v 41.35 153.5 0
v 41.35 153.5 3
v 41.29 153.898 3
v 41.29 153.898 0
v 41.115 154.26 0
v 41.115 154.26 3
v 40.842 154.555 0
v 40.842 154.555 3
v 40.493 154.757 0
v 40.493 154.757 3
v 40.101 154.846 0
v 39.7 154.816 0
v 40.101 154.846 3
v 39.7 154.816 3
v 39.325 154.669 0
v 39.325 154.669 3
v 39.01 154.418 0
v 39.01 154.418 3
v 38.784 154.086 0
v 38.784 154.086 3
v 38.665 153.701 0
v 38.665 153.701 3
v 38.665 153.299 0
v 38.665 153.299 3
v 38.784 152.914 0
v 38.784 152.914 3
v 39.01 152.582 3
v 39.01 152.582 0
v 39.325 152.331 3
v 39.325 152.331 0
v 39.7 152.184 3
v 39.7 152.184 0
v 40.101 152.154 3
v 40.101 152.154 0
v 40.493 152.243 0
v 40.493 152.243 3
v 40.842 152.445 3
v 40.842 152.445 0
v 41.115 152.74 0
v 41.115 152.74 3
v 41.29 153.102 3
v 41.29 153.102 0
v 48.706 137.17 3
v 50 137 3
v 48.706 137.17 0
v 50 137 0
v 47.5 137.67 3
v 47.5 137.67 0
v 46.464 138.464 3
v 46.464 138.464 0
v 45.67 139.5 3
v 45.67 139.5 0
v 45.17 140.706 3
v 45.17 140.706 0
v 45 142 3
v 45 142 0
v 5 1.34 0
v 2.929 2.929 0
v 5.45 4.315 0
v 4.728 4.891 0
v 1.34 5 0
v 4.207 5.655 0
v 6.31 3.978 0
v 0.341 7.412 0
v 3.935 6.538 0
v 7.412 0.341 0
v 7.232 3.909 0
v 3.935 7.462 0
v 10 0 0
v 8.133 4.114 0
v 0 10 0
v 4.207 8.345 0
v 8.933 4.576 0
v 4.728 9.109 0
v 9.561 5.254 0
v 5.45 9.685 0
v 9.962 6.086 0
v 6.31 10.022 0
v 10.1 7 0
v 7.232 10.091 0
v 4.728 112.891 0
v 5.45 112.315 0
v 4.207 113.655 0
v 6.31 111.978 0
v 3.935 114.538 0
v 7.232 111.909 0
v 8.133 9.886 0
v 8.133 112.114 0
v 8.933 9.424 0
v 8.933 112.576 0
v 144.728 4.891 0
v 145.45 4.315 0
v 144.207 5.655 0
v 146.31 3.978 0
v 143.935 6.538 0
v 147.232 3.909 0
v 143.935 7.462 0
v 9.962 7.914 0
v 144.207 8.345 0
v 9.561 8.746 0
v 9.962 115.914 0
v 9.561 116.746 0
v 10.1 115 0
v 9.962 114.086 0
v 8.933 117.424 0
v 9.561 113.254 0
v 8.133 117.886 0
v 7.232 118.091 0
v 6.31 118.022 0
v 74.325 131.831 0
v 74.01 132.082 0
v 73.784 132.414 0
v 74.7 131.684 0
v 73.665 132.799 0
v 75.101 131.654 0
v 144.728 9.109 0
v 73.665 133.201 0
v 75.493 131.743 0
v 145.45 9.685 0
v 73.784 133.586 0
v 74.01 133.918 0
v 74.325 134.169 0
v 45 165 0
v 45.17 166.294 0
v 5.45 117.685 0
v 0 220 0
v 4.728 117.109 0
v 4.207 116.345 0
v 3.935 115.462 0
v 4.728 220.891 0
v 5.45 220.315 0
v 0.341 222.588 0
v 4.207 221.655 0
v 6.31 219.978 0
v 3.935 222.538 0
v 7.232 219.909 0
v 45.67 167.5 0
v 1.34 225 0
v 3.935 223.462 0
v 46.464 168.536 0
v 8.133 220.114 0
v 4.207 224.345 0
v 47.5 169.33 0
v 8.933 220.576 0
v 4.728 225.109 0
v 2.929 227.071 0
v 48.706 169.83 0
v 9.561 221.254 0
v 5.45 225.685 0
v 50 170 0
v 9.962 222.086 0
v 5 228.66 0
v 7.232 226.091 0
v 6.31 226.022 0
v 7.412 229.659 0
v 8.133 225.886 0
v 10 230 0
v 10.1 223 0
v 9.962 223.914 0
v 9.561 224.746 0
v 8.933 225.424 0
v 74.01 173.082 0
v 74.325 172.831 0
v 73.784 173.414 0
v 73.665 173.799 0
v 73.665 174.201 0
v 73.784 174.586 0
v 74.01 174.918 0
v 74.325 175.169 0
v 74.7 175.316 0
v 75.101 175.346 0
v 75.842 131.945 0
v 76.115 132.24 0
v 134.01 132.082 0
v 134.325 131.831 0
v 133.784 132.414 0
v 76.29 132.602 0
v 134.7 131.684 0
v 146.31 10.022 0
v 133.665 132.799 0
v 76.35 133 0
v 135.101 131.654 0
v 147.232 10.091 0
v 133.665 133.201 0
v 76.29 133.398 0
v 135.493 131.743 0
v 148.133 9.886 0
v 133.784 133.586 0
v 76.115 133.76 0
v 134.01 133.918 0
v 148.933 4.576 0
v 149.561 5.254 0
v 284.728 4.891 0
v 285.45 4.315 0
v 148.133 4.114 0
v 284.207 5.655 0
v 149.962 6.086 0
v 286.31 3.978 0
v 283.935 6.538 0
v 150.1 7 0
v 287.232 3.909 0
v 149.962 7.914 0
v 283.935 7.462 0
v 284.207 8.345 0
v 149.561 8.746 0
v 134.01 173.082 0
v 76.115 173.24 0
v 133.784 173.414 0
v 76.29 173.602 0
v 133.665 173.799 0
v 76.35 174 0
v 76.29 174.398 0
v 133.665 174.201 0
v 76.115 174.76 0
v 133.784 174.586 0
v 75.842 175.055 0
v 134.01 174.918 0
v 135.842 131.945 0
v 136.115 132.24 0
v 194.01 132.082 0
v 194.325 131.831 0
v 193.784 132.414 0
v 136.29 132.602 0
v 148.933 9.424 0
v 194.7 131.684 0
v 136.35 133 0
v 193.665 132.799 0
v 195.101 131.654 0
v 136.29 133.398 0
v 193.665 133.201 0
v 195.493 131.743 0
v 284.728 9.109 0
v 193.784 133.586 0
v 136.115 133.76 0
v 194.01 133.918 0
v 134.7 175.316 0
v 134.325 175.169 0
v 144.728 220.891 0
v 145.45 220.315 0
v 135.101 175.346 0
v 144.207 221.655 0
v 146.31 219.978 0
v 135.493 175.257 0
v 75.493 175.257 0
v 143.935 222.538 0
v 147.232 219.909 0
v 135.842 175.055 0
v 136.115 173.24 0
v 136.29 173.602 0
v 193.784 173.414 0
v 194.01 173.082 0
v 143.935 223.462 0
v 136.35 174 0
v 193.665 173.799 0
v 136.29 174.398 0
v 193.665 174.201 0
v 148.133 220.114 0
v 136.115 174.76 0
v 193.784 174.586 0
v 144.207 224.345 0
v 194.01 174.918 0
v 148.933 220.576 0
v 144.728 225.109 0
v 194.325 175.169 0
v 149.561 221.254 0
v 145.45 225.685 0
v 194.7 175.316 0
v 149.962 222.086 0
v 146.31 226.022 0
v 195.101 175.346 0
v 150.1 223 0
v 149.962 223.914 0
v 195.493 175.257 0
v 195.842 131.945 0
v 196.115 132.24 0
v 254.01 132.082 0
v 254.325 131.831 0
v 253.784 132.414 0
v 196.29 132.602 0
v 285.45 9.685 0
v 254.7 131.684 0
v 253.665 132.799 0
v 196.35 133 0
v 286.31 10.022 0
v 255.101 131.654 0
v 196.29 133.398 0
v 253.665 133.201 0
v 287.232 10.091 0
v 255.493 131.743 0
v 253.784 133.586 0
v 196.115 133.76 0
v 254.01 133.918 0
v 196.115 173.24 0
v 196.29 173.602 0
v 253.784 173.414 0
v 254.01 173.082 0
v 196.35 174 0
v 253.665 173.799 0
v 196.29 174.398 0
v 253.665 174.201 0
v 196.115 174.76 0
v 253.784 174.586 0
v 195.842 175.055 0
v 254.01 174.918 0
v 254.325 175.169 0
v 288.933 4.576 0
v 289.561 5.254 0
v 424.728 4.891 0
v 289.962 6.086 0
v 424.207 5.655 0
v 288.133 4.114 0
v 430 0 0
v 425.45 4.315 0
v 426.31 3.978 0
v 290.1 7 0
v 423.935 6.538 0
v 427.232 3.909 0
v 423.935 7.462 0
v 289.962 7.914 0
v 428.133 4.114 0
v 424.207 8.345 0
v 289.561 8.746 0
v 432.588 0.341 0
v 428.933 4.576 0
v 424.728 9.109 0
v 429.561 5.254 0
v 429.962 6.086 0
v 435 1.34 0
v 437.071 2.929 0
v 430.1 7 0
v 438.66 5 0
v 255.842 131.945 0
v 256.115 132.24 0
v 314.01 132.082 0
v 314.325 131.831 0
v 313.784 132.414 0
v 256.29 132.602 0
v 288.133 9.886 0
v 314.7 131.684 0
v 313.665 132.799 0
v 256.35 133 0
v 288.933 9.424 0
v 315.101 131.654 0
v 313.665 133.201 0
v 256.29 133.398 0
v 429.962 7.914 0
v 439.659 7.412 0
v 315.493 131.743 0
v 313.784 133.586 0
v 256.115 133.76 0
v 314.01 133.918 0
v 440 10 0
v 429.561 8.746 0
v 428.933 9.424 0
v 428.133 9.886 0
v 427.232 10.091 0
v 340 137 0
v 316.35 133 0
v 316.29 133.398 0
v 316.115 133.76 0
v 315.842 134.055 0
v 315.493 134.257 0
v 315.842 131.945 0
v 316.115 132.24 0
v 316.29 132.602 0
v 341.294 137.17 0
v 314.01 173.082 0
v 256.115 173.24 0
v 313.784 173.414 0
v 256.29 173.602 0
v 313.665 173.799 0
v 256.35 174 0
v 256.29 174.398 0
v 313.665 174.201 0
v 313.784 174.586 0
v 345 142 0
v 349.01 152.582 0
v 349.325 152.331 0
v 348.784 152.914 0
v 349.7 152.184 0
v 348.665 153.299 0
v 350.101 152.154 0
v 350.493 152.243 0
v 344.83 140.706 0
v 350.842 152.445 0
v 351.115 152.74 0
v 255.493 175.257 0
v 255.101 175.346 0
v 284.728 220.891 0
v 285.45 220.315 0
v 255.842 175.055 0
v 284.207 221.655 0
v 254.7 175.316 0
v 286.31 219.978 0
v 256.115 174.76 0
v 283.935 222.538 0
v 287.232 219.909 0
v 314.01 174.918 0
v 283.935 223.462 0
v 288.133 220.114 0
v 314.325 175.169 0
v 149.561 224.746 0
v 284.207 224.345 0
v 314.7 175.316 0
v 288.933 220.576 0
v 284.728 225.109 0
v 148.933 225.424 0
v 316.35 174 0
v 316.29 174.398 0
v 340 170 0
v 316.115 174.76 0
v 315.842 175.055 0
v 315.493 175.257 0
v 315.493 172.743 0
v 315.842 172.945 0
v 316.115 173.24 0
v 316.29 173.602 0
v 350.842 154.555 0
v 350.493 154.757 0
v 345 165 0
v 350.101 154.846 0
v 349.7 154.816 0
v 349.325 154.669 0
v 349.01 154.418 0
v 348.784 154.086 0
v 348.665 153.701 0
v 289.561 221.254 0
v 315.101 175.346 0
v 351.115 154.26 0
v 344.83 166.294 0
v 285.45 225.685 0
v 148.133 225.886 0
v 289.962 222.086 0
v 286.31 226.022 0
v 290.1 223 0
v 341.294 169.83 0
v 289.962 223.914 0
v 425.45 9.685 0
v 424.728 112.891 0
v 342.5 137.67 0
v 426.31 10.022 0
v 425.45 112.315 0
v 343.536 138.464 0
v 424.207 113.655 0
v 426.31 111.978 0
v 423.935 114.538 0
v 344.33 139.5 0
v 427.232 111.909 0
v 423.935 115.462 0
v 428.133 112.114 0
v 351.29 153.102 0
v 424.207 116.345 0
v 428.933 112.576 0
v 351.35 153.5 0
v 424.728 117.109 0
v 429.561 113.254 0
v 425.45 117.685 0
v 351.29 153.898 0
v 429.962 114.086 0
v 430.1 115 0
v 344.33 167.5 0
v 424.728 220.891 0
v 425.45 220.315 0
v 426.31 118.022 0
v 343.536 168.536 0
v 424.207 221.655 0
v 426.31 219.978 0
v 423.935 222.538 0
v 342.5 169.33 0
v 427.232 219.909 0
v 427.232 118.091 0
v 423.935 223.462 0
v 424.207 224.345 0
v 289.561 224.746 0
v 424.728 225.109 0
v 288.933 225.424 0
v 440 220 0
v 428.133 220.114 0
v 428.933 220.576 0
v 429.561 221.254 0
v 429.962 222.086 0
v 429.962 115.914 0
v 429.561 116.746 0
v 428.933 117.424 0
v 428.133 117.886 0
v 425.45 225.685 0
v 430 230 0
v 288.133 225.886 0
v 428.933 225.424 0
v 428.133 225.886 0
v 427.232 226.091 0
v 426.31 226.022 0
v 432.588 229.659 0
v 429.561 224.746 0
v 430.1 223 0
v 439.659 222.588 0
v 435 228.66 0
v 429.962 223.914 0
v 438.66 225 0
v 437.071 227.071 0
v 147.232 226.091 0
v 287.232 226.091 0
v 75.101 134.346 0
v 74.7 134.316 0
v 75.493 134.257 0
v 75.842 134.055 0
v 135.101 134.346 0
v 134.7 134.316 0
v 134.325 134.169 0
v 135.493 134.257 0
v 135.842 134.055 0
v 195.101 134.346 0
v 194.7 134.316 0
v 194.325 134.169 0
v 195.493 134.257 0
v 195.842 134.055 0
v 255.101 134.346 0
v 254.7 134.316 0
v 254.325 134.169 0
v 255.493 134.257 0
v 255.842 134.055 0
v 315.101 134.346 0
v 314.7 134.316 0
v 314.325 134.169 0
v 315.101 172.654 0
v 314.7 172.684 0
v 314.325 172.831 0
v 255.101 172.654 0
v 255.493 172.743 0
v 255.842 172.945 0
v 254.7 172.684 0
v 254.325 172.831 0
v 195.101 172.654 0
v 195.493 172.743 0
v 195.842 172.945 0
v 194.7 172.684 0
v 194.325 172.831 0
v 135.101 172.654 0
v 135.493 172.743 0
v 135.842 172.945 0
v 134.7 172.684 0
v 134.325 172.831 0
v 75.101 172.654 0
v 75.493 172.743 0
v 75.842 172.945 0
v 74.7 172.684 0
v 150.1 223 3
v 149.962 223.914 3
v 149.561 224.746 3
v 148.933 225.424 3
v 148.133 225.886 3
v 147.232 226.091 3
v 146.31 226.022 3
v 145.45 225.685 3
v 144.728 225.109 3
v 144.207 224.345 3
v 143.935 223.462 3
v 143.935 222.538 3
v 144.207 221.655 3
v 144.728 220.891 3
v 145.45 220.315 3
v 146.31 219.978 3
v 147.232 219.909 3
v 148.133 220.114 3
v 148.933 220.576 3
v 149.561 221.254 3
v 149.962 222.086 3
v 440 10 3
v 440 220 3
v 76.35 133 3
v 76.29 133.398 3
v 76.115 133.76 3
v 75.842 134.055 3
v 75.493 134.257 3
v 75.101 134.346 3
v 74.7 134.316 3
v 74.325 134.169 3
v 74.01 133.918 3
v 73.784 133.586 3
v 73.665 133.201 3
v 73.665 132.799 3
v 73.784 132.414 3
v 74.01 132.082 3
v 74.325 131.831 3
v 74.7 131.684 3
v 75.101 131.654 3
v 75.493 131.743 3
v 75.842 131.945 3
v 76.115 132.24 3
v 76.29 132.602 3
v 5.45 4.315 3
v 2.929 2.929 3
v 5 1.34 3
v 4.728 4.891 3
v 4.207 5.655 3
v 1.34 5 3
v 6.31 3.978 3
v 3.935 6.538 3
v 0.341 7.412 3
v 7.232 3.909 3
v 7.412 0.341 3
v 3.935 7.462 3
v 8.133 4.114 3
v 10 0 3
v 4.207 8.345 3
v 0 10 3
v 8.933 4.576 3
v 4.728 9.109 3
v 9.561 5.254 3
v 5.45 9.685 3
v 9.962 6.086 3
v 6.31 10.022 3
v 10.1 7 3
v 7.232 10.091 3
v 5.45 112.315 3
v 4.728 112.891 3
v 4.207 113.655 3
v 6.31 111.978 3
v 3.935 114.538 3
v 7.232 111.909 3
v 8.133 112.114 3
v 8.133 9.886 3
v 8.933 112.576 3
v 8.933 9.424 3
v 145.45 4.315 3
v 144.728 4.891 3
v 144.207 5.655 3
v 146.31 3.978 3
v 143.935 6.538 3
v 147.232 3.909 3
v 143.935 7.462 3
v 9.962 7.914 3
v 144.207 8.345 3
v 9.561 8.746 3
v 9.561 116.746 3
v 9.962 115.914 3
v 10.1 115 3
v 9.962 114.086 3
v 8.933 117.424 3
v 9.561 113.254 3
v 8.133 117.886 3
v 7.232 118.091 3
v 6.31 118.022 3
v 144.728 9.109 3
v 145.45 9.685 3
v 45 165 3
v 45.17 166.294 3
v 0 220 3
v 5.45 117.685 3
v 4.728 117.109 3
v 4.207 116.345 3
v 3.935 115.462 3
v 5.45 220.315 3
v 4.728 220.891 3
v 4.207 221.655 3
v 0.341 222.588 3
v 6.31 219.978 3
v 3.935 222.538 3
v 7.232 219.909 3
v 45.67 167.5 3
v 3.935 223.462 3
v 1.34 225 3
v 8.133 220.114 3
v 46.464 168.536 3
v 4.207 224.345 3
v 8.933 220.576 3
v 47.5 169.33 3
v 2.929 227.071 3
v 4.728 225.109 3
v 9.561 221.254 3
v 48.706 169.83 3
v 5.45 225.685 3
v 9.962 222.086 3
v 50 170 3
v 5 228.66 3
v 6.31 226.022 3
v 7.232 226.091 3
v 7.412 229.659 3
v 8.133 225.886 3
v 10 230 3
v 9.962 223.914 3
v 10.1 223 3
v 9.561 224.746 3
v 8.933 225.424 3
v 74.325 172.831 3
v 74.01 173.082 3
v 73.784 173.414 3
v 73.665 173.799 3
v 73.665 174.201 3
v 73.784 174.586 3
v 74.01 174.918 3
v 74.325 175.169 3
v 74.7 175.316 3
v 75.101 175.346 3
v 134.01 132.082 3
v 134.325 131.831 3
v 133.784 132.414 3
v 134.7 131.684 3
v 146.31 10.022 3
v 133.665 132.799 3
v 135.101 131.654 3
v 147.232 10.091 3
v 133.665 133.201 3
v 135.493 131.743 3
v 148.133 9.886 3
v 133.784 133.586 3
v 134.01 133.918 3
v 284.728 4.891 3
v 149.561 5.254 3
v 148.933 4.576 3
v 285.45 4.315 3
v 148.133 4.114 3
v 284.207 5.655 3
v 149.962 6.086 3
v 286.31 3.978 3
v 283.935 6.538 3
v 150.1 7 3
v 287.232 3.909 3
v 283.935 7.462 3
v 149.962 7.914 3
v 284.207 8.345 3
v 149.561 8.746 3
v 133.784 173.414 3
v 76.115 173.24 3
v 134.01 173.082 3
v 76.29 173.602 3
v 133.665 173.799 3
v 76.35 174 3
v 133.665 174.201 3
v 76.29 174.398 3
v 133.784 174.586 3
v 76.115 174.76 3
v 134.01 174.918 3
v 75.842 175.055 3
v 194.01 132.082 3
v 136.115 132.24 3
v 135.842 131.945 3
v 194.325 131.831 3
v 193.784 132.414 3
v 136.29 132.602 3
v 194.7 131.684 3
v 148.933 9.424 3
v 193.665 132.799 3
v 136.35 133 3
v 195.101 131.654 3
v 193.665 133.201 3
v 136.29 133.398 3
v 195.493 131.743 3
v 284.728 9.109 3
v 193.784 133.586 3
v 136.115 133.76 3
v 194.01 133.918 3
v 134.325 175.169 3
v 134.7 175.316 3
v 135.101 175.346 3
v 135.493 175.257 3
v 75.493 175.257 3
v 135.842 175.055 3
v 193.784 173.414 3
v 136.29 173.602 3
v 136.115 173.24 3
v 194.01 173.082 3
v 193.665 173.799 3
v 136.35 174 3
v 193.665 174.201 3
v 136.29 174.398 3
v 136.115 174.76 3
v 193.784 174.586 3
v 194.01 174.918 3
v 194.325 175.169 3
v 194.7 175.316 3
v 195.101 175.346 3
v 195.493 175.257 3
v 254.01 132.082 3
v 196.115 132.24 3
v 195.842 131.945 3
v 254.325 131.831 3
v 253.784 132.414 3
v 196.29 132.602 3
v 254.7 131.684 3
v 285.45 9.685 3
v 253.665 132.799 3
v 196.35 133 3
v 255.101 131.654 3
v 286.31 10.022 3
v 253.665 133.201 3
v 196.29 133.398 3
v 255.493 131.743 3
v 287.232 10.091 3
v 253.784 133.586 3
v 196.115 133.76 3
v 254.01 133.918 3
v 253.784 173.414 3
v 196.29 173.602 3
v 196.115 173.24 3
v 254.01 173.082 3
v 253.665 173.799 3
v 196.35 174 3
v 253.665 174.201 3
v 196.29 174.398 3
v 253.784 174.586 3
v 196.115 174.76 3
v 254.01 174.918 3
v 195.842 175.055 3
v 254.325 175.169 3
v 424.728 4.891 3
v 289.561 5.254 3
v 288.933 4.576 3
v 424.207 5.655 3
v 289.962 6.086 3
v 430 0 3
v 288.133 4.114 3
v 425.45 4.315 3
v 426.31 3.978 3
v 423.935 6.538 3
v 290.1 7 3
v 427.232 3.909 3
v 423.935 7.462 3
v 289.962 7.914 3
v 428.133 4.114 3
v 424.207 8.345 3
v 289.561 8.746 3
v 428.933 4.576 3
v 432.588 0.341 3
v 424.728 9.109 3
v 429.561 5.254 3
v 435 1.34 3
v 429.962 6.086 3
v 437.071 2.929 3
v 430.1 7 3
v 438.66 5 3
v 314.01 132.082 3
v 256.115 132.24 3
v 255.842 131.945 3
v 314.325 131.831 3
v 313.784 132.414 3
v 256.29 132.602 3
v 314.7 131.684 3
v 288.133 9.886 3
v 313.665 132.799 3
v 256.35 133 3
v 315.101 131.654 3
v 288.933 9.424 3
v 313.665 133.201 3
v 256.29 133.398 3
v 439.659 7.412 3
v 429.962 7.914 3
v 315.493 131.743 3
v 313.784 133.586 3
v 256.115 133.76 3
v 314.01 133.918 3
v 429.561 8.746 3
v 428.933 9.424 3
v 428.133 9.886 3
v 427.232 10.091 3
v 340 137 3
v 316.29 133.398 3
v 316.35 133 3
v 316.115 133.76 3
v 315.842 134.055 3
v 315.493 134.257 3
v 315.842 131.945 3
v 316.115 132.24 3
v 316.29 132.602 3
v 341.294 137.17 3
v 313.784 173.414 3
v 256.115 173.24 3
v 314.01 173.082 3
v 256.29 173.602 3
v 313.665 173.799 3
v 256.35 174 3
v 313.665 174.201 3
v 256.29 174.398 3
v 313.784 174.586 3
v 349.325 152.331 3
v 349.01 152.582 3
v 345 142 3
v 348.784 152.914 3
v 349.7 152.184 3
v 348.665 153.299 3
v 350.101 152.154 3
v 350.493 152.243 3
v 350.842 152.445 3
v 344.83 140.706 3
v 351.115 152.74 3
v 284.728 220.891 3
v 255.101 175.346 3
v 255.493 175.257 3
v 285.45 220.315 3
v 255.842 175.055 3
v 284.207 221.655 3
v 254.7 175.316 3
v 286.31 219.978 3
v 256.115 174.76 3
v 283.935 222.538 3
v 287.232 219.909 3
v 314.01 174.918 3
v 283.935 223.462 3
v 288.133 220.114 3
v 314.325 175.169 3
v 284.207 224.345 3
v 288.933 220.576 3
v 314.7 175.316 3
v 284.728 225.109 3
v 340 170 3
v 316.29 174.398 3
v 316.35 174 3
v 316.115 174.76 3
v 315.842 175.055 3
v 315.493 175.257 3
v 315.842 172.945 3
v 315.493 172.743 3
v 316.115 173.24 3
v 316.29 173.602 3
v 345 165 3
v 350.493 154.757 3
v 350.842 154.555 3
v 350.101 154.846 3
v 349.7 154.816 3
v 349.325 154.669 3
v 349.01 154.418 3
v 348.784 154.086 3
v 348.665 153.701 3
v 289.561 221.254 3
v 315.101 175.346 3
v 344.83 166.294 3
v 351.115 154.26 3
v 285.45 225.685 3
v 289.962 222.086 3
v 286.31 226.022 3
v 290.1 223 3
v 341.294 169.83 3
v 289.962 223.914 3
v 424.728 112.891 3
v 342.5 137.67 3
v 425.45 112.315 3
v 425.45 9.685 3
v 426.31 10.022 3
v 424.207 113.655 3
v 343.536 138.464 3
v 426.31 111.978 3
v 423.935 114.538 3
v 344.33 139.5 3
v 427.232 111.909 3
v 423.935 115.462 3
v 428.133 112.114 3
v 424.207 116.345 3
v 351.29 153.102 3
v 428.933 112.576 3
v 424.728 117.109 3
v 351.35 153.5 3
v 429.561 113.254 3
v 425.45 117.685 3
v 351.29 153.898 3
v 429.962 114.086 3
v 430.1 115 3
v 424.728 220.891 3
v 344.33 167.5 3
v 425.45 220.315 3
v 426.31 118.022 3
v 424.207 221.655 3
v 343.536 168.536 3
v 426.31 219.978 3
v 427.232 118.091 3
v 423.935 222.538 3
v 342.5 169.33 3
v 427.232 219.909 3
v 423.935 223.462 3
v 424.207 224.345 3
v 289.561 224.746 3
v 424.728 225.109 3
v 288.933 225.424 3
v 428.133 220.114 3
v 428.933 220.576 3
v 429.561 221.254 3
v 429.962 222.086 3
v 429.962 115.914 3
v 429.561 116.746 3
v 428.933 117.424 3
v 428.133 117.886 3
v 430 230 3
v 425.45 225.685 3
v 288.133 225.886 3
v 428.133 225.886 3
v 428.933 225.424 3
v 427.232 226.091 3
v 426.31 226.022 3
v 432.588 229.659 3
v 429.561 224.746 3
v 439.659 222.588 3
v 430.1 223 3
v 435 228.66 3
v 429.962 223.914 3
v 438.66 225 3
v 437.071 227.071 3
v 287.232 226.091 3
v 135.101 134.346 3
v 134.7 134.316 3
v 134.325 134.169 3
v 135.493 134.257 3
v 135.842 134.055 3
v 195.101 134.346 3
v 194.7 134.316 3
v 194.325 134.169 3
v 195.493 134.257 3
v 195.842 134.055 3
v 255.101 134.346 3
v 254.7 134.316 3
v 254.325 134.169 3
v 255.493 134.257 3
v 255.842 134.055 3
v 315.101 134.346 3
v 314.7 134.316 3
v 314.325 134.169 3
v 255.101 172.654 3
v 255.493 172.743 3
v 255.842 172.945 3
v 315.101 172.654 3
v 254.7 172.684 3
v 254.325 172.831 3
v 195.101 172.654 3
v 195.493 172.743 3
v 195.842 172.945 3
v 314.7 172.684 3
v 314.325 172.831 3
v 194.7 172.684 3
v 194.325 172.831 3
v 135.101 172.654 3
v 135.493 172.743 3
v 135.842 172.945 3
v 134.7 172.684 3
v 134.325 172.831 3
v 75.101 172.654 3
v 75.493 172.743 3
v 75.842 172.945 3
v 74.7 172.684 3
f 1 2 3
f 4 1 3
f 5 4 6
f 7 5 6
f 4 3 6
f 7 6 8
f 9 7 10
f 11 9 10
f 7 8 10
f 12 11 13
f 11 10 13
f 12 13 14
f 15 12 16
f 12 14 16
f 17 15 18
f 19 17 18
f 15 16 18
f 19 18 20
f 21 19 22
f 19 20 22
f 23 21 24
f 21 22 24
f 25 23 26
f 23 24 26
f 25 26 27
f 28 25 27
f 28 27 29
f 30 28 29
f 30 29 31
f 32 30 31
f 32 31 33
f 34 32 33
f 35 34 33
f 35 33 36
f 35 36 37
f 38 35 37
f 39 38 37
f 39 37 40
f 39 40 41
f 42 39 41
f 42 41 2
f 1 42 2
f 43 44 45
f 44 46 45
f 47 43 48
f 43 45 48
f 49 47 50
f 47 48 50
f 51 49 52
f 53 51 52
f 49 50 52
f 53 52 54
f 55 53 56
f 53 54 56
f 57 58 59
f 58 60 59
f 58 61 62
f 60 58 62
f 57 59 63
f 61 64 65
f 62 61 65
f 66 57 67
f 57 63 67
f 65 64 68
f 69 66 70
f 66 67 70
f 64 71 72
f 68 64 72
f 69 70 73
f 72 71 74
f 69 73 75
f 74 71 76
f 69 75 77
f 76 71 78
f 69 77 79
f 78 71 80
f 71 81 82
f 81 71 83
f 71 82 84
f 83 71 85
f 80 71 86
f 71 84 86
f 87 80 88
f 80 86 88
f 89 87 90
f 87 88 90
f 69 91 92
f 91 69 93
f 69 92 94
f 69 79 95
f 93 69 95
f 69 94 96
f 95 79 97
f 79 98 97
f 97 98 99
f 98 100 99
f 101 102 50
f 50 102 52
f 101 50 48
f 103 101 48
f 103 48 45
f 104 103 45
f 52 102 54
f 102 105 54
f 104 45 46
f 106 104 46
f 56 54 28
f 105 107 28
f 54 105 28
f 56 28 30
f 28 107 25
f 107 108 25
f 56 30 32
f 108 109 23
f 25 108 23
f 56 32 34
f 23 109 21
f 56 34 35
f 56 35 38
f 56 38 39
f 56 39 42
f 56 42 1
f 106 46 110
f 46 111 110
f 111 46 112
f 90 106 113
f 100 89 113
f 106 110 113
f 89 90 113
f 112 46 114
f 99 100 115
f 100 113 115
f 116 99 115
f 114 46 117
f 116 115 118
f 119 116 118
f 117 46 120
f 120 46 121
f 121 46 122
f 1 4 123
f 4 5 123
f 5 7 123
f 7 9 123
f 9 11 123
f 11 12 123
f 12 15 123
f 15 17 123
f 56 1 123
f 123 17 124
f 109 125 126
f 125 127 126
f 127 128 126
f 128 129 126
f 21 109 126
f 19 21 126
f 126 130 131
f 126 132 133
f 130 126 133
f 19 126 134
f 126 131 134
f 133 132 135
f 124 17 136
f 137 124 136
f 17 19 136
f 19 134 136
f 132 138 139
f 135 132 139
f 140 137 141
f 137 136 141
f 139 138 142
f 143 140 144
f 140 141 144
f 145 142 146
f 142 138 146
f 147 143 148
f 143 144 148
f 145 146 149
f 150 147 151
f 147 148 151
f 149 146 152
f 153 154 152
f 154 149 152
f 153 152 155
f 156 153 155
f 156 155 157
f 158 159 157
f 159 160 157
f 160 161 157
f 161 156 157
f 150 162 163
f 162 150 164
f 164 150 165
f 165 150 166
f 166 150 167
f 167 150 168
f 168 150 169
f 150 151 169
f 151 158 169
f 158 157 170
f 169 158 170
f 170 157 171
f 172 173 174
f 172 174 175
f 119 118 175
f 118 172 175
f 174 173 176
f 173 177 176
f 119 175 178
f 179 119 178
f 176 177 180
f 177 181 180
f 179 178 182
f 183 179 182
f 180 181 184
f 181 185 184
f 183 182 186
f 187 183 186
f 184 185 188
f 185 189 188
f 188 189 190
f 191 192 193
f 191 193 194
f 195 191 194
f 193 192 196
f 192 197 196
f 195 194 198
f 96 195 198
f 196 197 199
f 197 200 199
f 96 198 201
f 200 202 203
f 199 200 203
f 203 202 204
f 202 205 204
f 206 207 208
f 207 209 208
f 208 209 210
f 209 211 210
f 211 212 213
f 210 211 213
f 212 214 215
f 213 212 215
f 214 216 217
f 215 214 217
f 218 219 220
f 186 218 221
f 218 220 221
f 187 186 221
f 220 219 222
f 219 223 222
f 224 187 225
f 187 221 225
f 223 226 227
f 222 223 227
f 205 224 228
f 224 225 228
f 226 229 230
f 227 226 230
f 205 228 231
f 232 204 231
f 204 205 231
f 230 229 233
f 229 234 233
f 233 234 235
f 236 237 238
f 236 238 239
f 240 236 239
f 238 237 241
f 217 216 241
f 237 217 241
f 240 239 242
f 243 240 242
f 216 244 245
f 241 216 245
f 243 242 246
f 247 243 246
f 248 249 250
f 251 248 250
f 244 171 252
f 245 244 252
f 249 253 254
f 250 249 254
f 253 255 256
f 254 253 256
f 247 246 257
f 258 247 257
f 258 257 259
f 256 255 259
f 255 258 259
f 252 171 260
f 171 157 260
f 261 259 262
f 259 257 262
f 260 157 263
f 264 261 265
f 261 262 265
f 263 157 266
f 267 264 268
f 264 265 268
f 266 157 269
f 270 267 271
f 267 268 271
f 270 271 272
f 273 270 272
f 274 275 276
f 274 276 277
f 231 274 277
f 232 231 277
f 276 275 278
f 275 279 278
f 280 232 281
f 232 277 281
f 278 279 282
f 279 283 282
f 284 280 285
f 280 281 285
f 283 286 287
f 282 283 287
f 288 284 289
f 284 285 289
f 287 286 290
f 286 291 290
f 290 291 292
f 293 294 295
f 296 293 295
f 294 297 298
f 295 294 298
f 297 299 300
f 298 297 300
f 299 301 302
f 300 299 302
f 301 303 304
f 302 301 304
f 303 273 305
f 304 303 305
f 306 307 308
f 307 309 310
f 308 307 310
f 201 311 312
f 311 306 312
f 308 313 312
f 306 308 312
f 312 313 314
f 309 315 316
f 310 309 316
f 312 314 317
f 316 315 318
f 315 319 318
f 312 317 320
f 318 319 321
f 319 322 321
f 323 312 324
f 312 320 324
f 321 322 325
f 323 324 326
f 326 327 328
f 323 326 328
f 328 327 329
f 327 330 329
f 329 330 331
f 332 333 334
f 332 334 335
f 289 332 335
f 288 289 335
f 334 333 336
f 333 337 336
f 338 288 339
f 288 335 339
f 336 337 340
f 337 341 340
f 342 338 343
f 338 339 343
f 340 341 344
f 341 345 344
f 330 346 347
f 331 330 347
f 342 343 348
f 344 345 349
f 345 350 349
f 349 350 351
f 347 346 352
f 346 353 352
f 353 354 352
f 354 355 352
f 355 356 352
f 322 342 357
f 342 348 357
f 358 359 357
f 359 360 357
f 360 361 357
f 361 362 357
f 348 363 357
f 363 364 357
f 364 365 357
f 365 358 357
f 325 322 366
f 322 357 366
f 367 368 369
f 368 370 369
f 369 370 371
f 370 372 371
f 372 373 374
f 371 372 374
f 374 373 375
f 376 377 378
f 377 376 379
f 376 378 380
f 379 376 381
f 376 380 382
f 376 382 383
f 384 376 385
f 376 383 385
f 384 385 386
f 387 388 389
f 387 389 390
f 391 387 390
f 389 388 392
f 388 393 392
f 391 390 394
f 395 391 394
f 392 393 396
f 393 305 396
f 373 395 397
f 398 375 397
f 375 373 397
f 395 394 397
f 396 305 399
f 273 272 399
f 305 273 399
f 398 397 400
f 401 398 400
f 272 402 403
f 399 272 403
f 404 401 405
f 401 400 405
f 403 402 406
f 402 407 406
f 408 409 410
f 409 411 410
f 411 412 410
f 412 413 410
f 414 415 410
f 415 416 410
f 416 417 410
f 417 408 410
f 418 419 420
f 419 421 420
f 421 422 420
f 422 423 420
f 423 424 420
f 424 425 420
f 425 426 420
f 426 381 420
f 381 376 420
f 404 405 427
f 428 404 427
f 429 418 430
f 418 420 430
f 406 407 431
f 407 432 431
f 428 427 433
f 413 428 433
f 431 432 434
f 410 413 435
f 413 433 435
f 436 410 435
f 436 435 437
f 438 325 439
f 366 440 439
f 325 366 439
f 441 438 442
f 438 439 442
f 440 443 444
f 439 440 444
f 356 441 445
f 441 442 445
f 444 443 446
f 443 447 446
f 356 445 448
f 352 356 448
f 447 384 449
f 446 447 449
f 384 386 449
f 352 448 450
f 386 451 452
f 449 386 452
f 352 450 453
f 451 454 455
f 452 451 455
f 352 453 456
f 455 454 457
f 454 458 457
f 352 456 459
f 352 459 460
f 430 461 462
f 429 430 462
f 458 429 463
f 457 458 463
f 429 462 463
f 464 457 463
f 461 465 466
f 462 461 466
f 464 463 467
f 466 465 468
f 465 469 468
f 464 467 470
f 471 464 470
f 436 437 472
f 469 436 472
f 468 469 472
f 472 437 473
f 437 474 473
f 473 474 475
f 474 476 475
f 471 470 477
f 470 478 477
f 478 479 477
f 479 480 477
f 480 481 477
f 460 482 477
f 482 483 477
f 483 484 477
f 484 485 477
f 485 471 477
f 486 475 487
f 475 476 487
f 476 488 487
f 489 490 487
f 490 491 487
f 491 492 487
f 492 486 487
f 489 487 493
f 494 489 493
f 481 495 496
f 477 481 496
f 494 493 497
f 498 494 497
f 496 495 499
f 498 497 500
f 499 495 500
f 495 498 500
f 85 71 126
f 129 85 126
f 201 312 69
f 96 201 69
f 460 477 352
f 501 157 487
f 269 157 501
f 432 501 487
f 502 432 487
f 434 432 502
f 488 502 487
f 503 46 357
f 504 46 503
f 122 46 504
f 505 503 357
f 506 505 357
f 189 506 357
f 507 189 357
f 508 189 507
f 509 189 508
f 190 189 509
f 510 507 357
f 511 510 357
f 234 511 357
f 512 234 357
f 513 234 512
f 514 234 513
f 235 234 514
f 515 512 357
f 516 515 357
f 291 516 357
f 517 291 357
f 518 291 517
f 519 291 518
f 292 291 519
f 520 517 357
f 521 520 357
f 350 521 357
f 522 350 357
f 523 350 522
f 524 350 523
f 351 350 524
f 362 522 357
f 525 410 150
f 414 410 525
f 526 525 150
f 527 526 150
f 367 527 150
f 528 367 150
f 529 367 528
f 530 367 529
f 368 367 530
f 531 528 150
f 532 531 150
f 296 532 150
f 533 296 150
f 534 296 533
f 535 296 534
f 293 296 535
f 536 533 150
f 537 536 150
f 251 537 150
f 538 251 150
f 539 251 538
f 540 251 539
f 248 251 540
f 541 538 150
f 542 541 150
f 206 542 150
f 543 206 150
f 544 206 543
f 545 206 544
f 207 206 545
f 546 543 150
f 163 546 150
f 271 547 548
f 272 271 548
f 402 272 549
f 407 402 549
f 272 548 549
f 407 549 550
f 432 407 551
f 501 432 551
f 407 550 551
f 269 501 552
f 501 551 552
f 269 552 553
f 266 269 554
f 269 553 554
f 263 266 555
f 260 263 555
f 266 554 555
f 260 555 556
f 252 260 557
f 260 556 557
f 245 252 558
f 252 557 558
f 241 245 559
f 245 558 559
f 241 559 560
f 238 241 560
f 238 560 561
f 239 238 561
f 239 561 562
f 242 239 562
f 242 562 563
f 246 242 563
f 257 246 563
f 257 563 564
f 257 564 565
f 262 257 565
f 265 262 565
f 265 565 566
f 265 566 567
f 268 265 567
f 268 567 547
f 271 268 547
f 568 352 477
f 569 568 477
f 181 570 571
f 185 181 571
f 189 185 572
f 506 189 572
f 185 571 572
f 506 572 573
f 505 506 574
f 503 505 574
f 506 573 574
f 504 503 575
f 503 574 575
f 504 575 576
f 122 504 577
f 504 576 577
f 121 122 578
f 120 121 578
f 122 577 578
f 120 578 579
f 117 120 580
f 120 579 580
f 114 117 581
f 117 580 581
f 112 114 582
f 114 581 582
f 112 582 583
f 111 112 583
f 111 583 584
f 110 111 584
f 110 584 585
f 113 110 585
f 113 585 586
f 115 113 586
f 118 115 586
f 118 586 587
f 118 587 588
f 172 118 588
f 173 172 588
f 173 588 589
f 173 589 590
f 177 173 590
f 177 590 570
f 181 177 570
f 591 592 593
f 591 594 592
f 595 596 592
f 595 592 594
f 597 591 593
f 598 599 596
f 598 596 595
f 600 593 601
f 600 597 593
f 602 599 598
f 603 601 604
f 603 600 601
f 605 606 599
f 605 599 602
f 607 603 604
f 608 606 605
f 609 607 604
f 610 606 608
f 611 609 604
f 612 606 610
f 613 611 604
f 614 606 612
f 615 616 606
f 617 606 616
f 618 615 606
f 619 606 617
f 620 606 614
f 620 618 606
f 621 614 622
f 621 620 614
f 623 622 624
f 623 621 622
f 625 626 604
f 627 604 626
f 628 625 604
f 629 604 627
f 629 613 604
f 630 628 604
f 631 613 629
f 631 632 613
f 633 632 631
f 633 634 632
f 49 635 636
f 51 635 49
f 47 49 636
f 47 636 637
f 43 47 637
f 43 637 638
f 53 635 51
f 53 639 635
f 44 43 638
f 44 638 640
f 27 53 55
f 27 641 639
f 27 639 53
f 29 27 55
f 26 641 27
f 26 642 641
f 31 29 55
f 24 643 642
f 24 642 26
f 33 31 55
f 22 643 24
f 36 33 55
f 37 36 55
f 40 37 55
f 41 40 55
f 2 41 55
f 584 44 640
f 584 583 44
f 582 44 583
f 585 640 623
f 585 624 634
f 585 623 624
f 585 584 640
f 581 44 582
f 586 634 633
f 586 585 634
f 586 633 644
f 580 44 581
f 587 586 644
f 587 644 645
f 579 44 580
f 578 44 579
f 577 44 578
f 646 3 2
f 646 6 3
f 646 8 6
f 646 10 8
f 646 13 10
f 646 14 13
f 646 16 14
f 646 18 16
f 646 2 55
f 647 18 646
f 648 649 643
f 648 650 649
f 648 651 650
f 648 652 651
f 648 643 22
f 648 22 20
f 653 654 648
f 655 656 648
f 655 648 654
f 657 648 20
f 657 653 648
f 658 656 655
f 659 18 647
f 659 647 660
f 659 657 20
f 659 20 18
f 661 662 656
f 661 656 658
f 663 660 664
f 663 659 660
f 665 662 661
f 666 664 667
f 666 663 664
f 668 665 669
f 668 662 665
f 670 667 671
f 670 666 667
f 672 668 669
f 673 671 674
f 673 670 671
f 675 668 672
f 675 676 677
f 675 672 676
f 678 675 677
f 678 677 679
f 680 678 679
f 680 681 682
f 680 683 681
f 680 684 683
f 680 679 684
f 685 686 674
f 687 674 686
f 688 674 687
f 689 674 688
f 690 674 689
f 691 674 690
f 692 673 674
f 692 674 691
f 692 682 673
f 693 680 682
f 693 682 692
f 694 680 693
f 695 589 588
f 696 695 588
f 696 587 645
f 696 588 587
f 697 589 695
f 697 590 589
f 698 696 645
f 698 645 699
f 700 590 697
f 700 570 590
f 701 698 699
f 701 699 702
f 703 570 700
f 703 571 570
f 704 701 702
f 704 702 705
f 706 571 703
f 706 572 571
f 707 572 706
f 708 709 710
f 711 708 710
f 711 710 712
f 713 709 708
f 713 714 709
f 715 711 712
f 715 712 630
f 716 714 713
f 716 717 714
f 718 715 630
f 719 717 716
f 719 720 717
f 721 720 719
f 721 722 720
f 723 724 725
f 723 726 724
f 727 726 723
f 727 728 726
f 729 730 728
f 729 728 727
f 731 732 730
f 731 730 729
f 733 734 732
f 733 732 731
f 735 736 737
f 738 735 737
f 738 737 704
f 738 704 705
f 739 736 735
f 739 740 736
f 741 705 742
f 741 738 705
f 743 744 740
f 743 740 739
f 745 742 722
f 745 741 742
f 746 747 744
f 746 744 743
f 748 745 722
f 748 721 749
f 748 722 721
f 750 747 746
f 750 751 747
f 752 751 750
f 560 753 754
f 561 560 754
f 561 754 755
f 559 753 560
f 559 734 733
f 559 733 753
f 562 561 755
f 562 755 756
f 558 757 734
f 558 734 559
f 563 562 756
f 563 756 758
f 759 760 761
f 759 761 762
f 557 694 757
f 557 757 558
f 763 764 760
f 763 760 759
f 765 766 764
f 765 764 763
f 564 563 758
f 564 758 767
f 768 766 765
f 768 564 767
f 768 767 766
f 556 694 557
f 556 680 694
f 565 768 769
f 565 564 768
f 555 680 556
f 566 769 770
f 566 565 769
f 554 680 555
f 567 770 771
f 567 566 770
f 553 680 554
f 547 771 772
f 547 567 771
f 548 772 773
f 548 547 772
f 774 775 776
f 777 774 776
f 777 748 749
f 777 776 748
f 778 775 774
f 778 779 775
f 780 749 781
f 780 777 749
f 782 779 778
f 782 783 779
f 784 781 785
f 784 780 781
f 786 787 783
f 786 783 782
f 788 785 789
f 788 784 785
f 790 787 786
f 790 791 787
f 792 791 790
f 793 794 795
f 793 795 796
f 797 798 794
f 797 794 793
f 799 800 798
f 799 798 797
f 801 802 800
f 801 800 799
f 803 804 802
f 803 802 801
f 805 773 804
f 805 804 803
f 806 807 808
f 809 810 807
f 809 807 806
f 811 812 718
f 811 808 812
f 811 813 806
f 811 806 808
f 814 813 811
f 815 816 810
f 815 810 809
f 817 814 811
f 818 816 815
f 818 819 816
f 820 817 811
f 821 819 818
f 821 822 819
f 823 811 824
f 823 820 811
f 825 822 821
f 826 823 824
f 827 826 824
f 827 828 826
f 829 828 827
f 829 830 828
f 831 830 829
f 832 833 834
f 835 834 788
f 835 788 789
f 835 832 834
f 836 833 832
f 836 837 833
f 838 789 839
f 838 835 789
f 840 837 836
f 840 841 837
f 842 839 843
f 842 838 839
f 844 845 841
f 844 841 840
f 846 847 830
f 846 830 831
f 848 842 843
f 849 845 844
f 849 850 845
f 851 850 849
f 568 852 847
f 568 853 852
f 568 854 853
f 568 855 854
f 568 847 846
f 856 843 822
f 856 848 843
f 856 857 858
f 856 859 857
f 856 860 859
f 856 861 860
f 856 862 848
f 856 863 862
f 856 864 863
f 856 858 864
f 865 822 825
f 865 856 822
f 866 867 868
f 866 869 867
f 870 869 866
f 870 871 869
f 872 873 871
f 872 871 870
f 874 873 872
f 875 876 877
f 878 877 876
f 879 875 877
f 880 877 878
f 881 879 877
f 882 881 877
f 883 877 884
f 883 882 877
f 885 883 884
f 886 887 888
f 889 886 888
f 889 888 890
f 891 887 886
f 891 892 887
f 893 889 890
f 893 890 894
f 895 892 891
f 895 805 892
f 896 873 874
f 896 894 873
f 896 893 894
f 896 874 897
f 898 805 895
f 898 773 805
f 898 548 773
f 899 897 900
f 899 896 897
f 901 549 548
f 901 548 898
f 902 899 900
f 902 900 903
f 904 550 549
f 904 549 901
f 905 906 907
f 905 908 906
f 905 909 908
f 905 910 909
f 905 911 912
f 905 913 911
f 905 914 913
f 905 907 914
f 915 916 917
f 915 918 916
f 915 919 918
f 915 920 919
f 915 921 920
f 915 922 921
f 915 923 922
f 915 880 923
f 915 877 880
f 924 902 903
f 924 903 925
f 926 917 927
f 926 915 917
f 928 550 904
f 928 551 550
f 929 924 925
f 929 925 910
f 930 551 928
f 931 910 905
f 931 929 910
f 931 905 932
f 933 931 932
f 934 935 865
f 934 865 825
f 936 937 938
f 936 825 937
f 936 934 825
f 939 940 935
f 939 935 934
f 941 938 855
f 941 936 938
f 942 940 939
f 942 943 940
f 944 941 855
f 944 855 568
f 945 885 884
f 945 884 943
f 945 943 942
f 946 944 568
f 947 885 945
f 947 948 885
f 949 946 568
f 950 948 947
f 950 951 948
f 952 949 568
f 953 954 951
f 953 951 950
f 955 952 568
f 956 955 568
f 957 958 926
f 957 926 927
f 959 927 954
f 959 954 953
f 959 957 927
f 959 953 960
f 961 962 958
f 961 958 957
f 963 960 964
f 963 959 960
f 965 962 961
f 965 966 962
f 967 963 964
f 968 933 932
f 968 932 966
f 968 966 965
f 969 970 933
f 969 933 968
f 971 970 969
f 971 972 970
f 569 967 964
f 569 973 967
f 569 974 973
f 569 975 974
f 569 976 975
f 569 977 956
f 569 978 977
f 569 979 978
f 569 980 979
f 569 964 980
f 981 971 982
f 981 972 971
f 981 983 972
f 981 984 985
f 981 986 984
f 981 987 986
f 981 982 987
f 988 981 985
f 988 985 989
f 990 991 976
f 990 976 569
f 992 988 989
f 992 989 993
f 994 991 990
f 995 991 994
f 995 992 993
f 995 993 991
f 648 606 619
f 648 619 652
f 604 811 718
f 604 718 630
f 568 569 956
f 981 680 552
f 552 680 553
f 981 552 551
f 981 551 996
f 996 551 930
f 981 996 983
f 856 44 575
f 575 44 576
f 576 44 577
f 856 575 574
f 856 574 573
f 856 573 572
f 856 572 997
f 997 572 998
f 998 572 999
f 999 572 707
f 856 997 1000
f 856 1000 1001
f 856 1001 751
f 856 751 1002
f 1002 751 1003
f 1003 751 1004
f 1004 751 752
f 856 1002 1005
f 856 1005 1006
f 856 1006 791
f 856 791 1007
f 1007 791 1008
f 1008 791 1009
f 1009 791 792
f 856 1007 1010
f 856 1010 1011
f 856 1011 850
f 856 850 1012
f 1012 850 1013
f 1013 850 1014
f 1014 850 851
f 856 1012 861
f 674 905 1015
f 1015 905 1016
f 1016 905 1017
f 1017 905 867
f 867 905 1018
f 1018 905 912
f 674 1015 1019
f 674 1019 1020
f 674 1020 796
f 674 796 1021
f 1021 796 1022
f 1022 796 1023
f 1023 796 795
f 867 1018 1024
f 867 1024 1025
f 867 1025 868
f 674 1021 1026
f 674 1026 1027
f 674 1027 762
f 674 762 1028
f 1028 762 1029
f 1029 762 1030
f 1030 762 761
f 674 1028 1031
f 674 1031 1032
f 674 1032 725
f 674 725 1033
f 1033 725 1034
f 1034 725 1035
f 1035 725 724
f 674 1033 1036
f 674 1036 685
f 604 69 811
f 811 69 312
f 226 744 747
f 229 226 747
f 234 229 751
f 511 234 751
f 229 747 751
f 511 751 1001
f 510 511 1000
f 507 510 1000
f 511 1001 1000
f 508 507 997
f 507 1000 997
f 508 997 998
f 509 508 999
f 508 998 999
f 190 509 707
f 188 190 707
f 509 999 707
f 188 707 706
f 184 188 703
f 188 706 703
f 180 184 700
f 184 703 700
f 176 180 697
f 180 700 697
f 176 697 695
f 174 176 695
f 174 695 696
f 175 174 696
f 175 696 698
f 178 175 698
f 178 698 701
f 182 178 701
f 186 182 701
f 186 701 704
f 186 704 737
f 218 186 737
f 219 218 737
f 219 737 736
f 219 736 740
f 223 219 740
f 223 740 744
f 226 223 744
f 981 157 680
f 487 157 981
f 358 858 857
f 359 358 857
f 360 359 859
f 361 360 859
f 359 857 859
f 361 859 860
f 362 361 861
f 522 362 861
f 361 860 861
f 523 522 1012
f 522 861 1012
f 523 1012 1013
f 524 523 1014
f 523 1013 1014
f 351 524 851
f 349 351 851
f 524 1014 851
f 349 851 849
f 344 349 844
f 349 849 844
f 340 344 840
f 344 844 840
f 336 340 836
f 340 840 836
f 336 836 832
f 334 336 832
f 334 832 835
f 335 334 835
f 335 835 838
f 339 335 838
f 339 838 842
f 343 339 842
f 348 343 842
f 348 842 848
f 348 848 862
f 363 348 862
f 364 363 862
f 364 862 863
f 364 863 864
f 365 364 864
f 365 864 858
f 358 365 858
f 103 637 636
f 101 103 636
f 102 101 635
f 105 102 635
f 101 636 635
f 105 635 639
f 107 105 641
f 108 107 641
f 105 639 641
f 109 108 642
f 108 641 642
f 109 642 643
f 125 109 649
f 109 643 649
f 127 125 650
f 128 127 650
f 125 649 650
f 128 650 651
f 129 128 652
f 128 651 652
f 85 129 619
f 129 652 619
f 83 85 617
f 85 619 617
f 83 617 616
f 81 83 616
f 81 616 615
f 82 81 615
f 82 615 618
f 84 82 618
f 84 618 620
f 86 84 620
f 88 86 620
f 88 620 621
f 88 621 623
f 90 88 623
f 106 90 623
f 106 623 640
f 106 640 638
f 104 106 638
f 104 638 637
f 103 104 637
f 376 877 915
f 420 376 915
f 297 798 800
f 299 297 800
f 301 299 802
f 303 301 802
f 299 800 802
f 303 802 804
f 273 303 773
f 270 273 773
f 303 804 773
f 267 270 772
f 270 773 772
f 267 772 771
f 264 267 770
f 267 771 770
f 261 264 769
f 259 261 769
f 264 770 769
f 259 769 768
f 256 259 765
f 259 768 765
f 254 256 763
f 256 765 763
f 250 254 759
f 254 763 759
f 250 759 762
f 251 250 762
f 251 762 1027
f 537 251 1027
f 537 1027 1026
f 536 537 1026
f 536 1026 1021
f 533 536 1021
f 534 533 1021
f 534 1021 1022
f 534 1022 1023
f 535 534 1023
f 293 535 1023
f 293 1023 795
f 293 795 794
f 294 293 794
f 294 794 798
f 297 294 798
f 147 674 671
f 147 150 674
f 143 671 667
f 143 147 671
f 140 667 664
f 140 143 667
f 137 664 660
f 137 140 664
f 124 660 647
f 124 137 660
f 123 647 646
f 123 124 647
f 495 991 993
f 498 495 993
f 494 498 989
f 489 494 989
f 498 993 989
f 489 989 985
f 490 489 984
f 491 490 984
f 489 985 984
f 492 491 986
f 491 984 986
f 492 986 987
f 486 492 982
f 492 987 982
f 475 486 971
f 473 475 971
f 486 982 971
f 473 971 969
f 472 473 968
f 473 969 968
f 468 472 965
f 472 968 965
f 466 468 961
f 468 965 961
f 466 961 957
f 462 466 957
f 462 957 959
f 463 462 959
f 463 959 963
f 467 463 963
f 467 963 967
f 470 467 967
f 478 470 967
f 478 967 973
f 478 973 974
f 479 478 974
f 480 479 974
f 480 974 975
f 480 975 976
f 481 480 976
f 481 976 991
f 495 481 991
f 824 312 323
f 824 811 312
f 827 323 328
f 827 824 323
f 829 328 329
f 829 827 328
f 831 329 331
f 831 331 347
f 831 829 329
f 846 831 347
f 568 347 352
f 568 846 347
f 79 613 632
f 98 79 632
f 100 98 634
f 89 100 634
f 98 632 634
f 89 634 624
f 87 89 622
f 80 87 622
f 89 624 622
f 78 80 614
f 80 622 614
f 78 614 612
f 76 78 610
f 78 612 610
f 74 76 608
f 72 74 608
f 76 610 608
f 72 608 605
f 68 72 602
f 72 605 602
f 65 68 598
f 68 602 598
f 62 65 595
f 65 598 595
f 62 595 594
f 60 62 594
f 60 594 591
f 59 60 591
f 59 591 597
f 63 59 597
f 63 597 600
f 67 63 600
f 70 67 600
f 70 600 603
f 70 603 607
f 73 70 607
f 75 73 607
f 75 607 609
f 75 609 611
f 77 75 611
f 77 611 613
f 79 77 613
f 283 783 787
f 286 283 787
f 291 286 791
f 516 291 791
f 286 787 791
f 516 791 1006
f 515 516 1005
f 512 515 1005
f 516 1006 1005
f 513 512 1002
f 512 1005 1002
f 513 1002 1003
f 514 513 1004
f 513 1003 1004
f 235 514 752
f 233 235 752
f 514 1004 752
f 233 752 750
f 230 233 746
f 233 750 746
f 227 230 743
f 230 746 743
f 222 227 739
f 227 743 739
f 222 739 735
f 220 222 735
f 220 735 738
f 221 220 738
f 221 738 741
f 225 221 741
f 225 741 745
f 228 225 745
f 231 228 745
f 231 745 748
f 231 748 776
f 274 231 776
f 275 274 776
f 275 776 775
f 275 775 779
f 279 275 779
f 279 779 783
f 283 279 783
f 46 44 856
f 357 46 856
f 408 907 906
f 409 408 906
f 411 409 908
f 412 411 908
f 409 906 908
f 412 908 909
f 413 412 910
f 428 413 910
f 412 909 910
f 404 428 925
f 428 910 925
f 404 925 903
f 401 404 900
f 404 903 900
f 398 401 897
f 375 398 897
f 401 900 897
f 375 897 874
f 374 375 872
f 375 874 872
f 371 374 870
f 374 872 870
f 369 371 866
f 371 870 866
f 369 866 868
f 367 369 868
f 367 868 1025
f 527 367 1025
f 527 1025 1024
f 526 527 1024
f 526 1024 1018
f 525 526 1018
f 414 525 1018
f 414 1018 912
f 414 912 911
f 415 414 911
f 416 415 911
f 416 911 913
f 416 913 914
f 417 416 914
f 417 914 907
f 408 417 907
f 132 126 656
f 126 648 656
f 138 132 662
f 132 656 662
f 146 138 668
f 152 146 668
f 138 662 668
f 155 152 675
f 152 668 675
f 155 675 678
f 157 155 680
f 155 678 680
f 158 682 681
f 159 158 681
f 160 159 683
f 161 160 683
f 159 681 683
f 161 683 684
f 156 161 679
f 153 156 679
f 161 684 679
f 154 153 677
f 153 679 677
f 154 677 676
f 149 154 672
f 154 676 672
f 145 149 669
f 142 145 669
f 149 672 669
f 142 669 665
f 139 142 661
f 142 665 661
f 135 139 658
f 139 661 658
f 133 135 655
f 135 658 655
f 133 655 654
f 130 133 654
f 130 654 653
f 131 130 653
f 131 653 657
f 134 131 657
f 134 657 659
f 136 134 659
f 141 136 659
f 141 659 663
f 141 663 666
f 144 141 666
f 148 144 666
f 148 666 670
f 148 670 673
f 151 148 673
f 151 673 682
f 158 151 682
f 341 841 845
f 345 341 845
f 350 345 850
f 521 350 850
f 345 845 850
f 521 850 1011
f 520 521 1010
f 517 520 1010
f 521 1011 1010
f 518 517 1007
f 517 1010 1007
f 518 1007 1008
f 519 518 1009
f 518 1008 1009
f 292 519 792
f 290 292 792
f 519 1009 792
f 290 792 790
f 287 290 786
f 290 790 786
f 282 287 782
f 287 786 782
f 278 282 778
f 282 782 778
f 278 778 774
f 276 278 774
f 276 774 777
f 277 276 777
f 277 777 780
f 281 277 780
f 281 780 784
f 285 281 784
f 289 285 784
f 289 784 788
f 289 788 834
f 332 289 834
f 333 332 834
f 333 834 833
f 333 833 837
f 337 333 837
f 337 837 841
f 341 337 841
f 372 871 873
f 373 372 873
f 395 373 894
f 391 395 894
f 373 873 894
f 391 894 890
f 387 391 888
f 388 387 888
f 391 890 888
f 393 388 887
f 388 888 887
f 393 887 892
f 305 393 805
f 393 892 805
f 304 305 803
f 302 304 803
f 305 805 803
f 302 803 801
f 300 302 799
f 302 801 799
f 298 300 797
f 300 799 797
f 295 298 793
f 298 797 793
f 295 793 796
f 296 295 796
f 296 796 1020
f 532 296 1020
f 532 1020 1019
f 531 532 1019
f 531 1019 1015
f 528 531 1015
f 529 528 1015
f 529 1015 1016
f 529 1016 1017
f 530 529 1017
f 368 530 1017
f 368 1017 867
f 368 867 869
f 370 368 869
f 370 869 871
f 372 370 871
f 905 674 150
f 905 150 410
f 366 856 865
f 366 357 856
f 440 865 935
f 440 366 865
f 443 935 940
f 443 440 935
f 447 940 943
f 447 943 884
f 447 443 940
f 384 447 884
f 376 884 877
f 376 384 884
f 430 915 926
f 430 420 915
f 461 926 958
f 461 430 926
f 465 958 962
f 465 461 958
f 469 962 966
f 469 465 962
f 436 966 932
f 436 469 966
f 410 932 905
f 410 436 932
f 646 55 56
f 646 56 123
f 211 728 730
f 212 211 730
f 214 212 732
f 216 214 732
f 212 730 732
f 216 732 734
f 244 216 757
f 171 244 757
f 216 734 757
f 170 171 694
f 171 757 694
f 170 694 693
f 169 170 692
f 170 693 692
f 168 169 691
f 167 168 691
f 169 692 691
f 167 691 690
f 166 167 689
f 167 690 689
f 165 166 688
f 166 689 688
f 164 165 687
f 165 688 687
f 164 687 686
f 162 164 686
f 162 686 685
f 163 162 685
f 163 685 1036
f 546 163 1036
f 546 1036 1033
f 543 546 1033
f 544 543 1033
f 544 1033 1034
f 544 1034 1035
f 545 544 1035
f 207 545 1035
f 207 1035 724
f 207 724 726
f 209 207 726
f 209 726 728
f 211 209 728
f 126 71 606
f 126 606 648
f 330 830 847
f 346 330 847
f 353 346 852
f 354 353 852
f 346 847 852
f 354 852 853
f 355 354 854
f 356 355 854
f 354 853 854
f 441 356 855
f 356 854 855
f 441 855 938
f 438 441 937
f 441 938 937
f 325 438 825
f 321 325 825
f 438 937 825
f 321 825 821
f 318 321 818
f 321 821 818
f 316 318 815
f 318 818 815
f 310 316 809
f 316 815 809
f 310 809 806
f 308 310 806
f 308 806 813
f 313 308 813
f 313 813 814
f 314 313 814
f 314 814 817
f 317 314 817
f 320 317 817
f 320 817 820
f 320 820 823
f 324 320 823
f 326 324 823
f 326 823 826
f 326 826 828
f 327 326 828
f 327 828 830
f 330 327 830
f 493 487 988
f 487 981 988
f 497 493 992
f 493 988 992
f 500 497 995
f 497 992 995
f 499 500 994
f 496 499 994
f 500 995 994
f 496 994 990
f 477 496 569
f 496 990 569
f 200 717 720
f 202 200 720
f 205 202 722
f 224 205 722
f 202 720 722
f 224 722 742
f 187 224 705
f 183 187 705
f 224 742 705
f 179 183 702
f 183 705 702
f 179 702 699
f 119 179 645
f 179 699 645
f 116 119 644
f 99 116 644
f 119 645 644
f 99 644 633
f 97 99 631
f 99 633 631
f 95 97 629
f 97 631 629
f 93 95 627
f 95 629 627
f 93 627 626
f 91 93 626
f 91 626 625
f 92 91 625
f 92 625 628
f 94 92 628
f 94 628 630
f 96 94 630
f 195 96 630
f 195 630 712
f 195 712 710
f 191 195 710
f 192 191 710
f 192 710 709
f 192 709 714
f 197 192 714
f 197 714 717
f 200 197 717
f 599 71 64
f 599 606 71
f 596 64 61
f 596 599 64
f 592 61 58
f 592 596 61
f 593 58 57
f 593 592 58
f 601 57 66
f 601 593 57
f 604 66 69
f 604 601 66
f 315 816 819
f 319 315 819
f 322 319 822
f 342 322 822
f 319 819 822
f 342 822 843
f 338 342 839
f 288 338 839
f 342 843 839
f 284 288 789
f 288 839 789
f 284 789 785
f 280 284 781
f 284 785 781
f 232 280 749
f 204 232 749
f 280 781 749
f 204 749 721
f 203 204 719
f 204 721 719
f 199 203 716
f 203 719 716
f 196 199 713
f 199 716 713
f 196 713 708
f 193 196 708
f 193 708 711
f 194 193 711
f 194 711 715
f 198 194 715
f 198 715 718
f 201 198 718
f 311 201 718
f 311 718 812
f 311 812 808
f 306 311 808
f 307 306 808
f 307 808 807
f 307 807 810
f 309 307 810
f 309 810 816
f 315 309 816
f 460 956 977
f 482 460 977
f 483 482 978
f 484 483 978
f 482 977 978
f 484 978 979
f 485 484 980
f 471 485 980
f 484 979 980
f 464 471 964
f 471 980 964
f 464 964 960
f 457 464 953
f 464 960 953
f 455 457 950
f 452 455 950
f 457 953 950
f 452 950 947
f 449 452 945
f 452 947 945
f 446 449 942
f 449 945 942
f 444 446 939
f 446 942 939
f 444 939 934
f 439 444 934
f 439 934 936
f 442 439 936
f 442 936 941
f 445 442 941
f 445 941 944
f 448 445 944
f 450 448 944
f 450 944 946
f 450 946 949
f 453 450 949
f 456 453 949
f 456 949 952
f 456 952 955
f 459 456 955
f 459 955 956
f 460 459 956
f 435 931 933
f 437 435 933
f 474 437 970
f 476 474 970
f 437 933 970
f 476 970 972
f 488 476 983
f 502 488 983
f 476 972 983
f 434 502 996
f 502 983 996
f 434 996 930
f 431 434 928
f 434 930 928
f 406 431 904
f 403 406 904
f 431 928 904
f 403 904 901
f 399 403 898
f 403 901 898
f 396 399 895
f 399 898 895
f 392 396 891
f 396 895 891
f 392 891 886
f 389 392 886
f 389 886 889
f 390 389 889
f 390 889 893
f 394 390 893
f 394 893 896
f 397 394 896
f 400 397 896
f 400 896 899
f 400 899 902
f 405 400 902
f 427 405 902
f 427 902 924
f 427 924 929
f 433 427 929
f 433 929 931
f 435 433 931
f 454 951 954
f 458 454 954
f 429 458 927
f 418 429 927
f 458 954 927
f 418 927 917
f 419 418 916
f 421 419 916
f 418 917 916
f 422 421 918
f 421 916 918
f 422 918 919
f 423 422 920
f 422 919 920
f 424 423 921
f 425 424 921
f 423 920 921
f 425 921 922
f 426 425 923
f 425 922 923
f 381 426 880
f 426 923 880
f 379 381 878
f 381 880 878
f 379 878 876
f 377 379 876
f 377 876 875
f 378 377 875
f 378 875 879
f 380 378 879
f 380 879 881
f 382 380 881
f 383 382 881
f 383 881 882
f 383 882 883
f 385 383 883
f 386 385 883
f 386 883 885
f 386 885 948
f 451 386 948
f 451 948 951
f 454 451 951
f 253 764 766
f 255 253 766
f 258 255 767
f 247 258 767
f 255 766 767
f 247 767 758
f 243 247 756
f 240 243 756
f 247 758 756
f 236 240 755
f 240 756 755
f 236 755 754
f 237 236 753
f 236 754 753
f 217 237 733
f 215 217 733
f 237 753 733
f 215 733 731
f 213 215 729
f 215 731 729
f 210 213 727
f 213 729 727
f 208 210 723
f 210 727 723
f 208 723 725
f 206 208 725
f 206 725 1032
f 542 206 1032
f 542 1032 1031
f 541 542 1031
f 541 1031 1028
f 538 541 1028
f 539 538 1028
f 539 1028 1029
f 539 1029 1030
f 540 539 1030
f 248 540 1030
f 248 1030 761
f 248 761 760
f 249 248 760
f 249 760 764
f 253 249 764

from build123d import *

# Parameters (mm, degrees)
F0_W     = 440
F0_H     = 230
F1_DEPTH = 3
F2_W     = 300
F2_H     = 33
F2_R     = 1.35
F2_R_2   = 3.1
F3_DEPTH = 3.001
F4_R     = 10
F5_R     = 5


with BuildPart() as f1:
    # F0 (on Top) → F1 (new body)
    with BuildSketch(Plane.XY):
        with Locations((220, 115)):
            Rectangle(F0_W, F0_H)
    extrude(amount=F1_DEPTH)

    # F2 (on face) → F3 (cut, through all)
    with BuildSketch(Plane.XY.offset(3)):
        with Locations((195, 153.5)):
            Rectangle(F2_W, F2_H)
        with Locations((40, 153.5)):
            Circle(F2_R)
        with Locations((75, 174)):
            Circle(F2_R)
        with Locations((75, 133)):
            Circle(F2_R)
        with Locations((135, 174)):
            Circle(F2_R)
        with Locations((135, 133)):
            Circle(F2_R)
        with Locations((195, 174)):
            Circle(F2_R)
        with Locations((195, 133)):
            Circle(F2_R)
        with Locations((255, 174)):
            Circle(F2_R)
        with Locations((255, 133)):
            Circle(F2_R)
        with Locations((315, 174)):
            Circle(F2_R)
        with Locations((315, 133)):
            Circle(F2_R)
        with Locations((350, 153.5)):
            Circle(F2_R)
        with Locations((7, 7)):
            Circle(F2_R_2)
        with Locations((7, 115)):
            Circle(F2_R_2)
        with Locations((147, 7)):
            Circle(F2_R_2)
        with Locations((287, 7)):
            Circle(F2_R_2)
        with Locations((427, 7)):
            Circle(F2_R_2)
        with Locations((427, 115)):
            Circle(F2_R_2)
        with Locations((7, 223)):
            Circle(F2_R_2)
        with Locations((147, 223)):
            Circle(F2_R_2)
        with Locations((287, 223)):
            Circle(F2_R_2)
        with Locations((427, 223)):
            Circle(F2_R_2)
    extrude(amount=-F3_DEPTH, mode=Mode.SUBTRACT)

    # F4
    f4_edges = [f1.edges().sort_by_distance(p)[0] for p in [
        (440, 0, 1.5),
        (0, 0, 1.5),
        (440, 230, 1.5),
        (0, 230, 1.5),
    ]]
    fillet(f4_edges, radius=F4_R)

    # F5
    f5_edges = [f1.edges().sort_by_distance(p)[0] for p in [
        (45, 137, 1.5),
        (45, 170, 1.5),
        (345, 170, 1.5),
        (345, 137, 1.5),
    ]]
    fillet(f5_edges, radius=F5_R)


solid = f1.part
